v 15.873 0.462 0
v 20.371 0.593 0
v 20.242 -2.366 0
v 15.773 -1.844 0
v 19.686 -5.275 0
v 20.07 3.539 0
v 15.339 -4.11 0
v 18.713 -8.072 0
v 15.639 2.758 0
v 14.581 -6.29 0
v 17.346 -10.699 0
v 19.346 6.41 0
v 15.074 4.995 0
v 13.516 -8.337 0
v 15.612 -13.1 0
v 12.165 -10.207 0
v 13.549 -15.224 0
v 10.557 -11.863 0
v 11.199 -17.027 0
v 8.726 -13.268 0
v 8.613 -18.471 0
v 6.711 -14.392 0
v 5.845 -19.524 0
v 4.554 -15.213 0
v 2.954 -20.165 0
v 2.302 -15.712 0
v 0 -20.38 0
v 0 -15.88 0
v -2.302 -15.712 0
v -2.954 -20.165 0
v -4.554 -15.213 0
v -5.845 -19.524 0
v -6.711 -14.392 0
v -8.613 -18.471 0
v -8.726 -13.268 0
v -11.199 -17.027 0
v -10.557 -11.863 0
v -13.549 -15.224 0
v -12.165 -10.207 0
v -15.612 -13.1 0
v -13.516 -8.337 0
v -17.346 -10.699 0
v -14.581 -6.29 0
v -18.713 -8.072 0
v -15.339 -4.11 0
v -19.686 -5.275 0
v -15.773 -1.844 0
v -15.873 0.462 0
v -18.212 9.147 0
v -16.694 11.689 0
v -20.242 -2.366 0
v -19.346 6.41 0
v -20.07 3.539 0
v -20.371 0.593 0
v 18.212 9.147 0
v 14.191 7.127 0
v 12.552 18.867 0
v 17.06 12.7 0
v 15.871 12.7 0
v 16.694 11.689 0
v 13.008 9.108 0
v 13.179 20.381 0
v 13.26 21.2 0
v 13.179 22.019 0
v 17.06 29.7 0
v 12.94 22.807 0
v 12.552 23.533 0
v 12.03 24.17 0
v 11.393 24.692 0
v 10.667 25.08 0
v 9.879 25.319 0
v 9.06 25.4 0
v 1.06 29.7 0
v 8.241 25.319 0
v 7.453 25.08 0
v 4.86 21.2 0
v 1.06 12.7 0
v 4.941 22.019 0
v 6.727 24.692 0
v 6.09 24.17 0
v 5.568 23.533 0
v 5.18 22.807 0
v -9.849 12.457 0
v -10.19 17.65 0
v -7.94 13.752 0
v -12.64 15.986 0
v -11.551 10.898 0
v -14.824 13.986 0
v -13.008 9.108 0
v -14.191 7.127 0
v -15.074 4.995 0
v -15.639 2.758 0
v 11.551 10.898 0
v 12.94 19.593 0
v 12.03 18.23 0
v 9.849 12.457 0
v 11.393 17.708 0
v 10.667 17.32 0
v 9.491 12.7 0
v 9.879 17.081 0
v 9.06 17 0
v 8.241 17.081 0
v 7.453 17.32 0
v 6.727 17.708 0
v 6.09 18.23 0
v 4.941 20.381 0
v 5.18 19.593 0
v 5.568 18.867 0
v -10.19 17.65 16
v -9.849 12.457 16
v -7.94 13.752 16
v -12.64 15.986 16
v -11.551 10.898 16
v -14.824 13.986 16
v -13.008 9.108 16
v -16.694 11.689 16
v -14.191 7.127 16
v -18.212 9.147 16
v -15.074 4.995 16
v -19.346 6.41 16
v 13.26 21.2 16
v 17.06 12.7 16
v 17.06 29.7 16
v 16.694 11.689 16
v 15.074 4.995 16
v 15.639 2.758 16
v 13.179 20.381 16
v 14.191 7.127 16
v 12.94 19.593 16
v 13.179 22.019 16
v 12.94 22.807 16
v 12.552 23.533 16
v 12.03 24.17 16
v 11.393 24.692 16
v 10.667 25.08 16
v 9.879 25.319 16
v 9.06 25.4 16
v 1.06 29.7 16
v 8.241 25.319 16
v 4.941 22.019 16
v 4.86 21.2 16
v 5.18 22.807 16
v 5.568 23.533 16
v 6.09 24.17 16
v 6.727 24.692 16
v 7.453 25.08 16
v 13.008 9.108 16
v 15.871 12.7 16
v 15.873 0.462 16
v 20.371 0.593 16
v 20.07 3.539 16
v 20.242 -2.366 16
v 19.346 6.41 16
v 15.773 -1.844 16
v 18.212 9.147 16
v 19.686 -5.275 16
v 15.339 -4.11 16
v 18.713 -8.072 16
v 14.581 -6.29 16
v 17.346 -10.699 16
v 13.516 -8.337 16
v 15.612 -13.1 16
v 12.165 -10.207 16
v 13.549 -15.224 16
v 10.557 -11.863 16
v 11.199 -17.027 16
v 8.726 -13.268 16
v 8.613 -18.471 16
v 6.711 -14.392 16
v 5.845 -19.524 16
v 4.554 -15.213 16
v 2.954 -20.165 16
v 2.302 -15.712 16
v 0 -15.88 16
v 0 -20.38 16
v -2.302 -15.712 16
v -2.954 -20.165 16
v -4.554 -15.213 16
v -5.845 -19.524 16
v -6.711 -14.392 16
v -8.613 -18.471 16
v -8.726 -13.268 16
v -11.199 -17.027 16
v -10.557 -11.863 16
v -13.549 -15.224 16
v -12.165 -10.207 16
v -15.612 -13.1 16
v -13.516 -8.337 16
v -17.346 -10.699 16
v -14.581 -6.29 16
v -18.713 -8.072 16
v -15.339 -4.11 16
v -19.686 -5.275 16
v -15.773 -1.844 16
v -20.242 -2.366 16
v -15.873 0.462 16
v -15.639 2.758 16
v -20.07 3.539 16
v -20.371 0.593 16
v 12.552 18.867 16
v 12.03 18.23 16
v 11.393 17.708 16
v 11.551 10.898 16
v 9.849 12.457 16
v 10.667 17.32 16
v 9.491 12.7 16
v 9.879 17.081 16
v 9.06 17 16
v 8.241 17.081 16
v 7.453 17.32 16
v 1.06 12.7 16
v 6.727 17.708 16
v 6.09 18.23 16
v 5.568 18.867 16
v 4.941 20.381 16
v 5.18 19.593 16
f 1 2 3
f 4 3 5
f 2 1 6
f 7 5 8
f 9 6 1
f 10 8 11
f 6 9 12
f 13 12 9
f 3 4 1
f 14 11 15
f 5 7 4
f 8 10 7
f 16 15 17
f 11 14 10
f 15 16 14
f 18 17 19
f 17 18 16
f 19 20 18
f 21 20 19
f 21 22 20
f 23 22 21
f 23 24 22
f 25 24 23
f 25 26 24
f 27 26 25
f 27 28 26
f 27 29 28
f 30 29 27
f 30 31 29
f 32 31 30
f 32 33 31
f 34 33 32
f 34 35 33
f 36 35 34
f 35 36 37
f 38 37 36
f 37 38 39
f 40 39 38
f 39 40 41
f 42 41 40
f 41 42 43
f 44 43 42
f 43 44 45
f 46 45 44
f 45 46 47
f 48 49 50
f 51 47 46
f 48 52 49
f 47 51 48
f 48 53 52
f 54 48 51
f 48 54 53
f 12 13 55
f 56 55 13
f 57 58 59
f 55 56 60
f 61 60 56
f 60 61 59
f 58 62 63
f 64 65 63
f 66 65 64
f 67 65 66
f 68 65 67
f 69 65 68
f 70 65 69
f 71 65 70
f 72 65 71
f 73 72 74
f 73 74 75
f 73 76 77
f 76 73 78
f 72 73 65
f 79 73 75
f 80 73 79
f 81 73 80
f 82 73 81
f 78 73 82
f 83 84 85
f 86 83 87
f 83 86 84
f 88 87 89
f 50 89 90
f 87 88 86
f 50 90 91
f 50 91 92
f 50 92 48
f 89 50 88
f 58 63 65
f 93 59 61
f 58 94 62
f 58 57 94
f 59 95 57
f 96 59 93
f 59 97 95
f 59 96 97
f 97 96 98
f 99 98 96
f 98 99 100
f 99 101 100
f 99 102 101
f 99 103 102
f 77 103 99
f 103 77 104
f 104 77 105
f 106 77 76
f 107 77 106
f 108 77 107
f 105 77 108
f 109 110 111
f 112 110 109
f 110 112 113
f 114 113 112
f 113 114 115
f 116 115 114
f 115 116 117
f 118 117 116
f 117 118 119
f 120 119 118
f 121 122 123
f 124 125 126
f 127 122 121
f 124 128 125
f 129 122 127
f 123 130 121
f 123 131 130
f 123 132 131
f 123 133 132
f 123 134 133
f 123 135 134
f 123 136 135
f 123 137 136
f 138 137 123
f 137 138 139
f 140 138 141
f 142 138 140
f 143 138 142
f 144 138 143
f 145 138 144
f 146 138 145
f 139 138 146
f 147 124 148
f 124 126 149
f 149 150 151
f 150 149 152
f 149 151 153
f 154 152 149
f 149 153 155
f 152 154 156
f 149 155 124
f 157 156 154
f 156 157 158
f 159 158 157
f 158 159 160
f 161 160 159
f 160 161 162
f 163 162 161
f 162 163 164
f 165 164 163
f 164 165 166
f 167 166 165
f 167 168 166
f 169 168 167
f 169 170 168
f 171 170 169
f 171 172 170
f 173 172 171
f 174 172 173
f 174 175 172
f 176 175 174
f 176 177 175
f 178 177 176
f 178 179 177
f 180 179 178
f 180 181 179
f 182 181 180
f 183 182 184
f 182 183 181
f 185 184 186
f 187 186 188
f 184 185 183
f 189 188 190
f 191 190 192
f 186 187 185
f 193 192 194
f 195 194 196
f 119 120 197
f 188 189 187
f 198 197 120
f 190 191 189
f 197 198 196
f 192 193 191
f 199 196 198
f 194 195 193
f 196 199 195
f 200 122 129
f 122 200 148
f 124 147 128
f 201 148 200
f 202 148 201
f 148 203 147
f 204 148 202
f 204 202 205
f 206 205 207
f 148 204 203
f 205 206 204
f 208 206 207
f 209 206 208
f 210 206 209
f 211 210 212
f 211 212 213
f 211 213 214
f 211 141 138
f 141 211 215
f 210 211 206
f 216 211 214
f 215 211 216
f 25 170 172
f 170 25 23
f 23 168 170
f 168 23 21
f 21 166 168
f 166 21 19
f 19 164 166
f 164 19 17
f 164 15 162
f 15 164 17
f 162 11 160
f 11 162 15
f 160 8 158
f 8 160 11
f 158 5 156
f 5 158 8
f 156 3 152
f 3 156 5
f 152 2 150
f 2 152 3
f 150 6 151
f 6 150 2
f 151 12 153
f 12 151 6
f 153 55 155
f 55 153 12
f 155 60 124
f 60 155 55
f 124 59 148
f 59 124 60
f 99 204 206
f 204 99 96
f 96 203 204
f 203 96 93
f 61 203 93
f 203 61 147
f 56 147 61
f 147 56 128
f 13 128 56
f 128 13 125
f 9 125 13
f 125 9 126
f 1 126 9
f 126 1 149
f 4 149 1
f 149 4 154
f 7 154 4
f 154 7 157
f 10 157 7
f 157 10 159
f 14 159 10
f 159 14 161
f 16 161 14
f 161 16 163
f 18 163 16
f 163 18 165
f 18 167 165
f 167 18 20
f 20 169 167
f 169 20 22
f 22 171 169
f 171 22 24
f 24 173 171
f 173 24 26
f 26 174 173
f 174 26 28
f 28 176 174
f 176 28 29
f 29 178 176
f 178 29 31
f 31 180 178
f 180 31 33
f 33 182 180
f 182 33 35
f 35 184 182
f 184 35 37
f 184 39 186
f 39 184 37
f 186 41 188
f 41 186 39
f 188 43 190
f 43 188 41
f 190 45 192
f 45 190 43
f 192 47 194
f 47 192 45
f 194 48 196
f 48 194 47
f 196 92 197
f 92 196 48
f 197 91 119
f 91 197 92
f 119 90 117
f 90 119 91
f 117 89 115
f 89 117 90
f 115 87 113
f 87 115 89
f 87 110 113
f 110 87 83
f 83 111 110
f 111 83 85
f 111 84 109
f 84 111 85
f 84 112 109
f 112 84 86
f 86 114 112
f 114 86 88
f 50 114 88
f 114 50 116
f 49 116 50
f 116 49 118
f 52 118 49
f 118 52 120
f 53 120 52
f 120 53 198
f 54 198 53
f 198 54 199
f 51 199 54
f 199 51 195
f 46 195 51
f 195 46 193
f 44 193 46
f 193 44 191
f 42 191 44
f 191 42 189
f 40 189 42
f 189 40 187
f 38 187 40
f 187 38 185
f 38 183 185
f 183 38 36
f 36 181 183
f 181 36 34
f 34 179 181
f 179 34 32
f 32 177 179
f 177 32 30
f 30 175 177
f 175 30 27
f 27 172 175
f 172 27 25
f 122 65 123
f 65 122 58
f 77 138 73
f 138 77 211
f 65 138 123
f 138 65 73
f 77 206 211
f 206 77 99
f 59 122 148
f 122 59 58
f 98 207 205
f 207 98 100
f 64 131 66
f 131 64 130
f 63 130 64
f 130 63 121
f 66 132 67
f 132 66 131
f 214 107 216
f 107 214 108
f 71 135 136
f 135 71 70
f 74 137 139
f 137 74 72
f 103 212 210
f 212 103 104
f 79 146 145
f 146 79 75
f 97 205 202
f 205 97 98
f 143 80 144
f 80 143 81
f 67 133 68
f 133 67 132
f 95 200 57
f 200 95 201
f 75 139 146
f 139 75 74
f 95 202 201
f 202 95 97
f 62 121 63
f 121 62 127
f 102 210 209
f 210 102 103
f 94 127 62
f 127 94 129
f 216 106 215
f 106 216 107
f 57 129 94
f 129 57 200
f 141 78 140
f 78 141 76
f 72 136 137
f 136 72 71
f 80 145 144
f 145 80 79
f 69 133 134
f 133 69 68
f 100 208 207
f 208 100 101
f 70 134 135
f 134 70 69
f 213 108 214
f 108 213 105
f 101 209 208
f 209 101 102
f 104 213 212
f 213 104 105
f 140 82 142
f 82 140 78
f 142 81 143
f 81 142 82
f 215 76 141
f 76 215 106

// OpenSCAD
$fn = 32;

// ----------------------------------------------------------------------
// Pipe clamp: 40.76 mm ring, 4.5 mm wall, 16 mm wide
// ----------------------------------------------------------------------

// --- parameters (mm) ---
outer_r = 20.38;          // clamp outside radius
inner_r = 15.88;          // pipe bore radius
band = 4.5;               // band thickness
clamp_w = 16;             // clamp width
opening = 60;             // opening angle between the ends
lug_w = 16;               // lug width
lug_len = 17;             // lug length
bolt_d = 8.4;             // bolt hole

clamp_profile = [[-10.19, 17.65], [-12.64, 15.986], [-14.824, 13.986], [-16.694, 11.689], [-18.212, 9.147], [-19.346, 6.41], [-20.07, 3.539], [-20.371, 0.593], [-20.242, -2.366], [-19.686, -5.275], [-18.713, -8.072], [-17.346, -10.699], [-15.612, -13.1], [-13.549, -15.224], [-11.199, -17.027], [-8.613, -18.471], [-5.845, -19.524], [-2.954, -20.165], [0, -20.38], [2.954, -20.165], [5.845, -19.524], [8.613, -18.471], [11.199, -17.027], [13.549, -15.224], [15.612, -13.1], [17.346, -10.699], [18.713, -8.072], [19.686, -5.275], [20.242, -2.366], [20.371, 0.593], [20.07, 3.539], [19.346, 6.41], [18.212, 9.147], [16.694, 11.689], [14.824, 13.986], [12.64, 15.986], [10.19, 17.65], [7.94, 13.752], [9.849, 12.457], [11.551, 10.898], [13.008, 9.108], [14.191, 7.127], [15.074, 4.995], [15.639, 2.758], [15.873, 0.462], [15.773, -1.844], [15.339, -4.11], [14.581, -6.29], [13.516, -8.337], [12.165, -10.207], [10.557, -11.863], [8.726, -13.268], [6.711, -14.392], [4.554, -15.213], [2.302, -15.712], [0, -15.88], [-2.302, -15.712], [-4.554, -15.213], [-6.711, -14.392], [-8.726, -13.268], [-10.557, -11.863], [-12.165, -10.207], [-13.516, -8.337], [-14.581, -6.29], [-15.339, -4.11], [-15.773, -1.844], [-15.873, 0.462], [-15.639, 2.758], [-15.074, 4.995], [-14.191, 7.127], [-13.008, 9.108], [-11.551, 10.898], [-9.849, 12.457], [-7.94, 13.752]];

difference() {
  union() {
    linear_extrude(height = clamp_w) polygon(clamp_profile);
    /* bolt lug on the other end */
    translate([1.06, 12.7, 0]) cube([lug_w, 17, clamp_w]);
  }
  translate([9.06, 21.2, -2.5]) cylinder(h = clamp_w + 5, d = bolt_d);
}
